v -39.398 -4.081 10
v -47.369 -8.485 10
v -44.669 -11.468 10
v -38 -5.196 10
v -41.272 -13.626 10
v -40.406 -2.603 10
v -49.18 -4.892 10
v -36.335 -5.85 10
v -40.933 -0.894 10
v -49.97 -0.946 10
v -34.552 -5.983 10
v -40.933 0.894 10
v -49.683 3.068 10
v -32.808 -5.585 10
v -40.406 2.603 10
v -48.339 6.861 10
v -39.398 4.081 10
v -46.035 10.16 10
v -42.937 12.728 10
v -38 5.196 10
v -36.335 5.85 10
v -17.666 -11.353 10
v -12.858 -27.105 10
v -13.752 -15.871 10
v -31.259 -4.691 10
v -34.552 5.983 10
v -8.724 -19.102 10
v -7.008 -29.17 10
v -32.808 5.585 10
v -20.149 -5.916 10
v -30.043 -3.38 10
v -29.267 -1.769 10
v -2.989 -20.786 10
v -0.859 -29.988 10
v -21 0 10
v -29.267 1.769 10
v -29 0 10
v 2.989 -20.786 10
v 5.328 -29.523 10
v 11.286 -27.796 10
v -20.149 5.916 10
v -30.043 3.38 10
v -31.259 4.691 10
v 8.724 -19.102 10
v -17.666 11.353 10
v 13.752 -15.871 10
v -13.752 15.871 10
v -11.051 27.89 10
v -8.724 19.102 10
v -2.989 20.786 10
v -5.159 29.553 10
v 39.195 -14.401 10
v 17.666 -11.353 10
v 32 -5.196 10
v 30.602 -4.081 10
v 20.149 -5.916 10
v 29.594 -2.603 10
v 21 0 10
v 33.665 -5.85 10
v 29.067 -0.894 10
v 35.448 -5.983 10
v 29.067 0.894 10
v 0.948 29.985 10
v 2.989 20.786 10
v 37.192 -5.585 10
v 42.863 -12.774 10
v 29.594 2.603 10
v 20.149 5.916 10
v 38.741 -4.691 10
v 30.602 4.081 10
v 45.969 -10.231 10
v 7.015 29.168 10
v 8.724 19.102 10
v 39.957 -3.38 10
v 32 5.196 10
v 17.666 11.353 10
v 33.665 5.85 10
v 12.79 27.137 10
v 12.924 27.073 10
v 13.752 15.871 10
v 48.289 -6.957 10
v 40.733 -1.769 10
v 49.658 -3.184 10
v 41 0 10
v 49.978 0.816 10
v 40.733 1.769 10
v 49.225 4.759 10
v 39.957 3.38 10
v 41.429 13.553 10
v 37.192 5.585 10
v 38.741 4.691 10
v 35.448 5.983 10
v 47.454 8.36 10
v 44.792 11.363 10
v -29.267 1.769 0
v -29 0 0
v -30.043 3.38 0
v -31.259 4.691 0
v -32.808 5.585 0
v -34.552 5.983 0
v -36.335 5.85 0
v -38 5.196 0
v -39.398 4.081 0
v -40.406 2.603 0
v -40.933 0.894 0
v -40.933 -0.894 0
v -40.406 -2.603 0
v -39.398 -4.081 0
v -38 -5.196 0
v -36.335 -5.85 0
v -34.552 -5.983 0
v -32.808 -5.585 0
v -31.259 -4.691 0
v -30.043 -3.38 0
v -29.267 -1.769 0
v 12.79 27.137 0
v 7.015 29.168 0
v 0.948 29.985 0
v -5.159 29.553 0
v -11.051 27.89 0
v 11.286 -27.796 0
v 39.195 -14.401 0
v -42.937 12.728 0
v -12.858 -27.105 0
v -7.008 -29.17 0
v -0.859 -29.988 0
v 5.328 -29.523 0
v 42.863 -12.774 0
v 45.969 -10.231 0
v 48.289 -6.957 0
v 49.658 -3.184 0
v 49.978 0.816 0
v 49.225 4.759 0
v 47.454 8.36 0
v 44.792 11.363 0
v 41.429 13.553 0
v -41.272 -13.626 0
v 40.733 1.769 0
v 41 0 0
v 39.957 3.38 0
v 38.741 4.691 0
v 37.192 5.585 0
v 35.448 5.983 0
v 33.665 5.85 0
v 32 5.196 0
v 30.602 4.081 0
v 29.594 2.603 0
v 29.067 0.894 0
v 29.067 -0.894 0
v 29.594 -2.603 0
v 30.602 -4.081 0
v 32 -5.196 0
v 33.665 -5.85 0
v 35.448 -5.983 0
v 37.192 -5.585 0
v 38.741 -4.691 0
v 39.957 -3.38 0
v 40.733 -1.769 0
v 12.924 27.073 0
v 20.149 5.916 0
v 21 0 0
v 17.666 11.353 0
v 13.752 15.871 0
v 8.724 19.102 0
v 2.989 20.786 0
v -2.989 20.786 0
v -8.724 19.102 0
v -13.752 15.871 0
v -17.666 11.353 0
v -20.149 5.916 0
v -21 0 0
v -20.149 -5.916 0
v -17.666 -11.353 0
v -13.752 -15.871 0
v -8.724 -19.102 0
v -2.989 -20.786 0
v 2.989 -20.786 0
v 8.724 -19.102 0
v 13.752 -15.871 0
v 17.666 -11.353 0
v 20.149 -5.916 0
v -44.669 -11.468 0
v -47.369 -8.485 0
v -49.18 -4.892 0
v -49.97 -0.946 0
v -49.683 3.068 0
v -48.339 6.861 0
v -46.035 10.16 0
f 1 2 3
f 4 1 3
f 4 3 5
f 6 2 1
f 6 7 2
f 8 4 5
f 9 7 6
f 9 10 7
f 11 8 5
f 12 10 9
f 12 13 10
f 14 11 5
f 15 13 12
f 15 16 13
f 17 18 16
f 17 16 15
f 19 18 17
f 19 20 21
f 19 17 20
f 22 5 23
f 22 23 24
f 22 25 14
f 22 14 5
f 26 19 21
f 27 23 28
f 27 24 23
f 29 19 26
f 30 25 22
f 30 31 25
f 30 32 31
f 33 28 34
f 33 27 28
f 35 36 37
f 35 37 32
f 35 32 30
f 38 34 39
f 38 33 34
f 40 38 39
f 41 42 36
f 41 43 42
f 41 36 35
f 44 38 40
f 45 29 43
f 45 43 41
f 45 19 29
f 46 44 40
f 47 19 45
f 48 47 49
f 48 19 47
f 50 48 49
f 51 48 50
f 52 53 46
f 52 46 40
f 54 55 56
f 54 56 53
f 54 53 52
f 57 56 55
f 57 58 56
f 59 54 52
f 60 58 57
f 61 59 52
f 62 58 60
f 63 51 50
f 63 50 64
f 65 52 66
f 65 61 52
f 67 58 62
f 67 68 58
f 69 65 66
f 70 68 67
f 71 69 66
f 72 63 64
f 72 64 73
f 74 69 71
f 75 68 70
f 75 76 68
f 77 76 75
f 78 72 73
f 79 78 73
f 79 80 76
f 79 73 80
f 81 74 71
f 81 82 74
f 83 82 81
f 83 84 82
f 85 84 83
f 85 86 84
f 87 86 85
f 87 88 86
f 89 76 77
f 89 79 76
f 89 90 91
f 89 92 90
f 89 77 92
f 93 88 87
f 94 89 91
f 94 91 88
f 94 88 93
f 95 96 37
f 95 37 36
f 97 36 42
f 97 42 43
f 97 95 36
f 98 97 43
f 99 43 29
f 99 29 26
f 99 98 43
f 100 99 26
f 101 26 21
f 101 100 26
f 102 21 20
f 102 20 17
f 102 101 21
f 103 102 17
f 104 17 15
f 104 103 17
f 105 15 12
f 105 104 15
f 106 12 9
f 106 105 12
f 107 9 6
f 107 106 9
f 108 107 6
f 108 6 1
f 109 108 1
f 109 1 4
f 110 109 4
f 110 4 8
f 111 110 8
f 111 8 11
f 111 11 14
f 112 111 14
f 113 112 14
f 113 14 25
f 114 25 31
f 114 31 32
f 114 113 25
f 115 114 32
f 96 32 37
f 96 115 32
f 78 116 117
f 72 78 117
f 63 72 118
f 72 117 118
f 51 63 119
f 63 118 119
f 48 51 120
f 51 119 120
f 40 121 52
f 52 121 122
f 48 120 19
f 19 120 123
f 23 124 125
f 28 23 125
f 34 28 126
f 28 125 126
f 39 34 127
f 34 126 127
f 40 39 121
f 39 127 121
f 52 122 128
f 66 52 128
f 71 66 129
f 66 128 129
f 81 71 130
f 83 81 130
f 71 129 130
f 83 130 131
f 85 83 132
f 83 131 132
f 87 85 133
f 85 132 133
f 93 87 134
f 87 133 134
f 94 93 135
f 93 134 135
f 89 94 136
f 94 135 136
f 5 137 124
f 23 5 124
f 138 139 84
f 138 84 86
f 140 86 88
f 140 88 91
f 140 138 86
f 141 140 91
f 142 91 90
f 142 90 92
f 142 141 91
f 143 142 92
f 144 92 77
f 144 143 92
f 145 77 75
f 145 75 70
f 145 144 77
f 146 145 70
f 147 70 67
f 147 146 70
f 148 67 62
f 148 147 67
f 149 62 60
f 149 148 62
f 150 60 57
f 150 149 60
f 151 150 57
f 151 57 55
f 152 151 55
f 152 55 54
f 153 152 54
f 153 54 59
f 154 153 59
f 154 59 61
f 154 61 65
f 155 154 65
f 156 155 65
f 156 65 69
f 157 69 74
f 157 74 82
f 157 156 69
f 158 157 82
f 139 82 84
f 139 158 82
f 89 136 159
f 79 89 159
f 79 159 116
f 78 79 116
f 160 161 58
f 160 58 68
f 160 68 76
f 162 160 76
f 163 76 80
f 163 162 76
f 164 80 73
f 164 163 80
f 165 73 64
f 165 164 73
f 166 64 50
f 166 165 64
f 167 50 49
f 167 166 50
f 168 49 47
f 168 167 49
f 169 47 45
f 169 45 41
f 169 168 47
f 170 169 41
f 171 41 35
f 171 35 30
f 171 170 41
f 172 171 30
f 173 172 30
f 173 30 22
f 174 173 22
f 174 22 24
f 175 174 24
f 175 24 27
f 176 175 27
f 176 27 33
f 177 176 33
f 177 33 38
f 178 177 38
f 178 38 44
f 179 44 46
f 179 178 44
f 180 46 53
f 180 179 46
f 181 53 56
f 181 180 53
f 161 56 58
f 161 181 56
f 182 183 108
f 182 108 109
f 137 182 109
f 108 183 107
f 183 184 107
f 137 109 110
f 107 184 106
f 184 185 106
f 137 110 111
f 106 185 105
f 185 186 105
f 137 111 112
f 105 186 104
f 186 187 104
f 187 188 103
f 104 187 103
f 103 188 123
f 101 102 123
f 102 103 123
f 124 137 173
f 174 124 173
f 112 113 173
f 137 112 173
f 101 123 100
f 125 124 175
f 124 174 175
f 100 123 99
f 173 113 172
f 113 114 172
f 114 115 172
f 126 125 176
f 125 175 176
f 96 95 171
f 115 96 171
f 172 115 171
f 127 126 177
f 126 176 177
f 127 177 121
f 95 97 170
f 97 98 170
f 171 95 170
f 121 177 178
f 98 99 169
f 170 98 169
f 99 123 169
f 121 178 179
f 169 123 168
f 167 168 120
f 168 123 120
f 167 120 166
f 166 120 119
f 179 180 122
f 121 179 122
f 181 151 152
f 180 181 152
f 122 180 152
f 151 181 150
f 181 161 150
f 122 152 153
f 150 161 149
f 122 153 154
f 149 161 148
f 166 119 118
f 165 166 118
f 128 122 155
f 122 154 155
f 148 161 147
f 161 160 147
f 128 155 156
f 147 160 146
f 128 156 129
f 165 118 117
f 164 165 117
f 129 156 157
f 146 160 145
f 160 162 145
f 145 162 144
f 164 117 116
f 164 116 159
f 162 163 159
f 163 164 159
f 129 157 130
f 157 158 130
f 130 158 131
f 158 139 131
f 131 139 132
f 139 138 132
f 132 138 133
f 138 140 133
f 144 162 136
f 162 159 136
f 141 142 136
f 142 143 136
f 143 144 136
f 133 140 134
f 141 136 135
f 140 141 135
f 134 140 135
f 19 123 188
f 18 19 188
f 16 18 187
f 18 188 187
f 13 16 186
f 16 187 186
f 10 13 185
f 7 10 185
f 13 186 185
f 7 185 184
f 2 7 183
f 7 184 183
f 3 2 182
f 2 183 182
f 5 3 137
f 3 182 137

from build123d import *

# Parameters (mm, degrees)
F0_R     = 6
F0_R_2   = 21
F1_DEPTH = 10


with BuildPart() as f1:
    # F0 (on Top) → F1 (new body)
    with BuildSketch(Plane.XY):
        with BuildLine():
            Line((-41.271994, -13.625788), (-12.858001, -27.10483))
            ThreePointArc((-12.858001, -27.10483), (-0.858643, -29.98771), (11.286012, -27.796149))
            Line((11.286012, -27.796149), (39.195127, -14.40142))
            ThreePointArc((39.195127, -14.40142), (49.952353, -1.194627), (41.428532, 13.552637))
            Line((41.428532, 13.552637), (12.924047, 27.0734))
            Line((12.924047, 27.0734), (12.790003, 27.136983))
            ThreePointArc((12.790003, 27.136983), (0.947593, 29.985031), (-11.051015, 27.890412))
            Line((-11.051015, 27.890412), (-42.937387, 12.727839))
            ThreePointArc((-42.937387, 12.727839), (-49.970138, -0.946024), (-41.271994, -13.625788))
        make_face()
        with Locations((-35, 0)):
            Circle(F0_R, mode=Mode.SUBTRACT)
        Circle(F0_R_2, mode=Mode.SUBTRACT)
        with Locations((35, 0)):
            Circle(F0_R, mode=Mode.SUBTRACT)
    extrude(amount=F1_DEPTH)


solid = f1.part
